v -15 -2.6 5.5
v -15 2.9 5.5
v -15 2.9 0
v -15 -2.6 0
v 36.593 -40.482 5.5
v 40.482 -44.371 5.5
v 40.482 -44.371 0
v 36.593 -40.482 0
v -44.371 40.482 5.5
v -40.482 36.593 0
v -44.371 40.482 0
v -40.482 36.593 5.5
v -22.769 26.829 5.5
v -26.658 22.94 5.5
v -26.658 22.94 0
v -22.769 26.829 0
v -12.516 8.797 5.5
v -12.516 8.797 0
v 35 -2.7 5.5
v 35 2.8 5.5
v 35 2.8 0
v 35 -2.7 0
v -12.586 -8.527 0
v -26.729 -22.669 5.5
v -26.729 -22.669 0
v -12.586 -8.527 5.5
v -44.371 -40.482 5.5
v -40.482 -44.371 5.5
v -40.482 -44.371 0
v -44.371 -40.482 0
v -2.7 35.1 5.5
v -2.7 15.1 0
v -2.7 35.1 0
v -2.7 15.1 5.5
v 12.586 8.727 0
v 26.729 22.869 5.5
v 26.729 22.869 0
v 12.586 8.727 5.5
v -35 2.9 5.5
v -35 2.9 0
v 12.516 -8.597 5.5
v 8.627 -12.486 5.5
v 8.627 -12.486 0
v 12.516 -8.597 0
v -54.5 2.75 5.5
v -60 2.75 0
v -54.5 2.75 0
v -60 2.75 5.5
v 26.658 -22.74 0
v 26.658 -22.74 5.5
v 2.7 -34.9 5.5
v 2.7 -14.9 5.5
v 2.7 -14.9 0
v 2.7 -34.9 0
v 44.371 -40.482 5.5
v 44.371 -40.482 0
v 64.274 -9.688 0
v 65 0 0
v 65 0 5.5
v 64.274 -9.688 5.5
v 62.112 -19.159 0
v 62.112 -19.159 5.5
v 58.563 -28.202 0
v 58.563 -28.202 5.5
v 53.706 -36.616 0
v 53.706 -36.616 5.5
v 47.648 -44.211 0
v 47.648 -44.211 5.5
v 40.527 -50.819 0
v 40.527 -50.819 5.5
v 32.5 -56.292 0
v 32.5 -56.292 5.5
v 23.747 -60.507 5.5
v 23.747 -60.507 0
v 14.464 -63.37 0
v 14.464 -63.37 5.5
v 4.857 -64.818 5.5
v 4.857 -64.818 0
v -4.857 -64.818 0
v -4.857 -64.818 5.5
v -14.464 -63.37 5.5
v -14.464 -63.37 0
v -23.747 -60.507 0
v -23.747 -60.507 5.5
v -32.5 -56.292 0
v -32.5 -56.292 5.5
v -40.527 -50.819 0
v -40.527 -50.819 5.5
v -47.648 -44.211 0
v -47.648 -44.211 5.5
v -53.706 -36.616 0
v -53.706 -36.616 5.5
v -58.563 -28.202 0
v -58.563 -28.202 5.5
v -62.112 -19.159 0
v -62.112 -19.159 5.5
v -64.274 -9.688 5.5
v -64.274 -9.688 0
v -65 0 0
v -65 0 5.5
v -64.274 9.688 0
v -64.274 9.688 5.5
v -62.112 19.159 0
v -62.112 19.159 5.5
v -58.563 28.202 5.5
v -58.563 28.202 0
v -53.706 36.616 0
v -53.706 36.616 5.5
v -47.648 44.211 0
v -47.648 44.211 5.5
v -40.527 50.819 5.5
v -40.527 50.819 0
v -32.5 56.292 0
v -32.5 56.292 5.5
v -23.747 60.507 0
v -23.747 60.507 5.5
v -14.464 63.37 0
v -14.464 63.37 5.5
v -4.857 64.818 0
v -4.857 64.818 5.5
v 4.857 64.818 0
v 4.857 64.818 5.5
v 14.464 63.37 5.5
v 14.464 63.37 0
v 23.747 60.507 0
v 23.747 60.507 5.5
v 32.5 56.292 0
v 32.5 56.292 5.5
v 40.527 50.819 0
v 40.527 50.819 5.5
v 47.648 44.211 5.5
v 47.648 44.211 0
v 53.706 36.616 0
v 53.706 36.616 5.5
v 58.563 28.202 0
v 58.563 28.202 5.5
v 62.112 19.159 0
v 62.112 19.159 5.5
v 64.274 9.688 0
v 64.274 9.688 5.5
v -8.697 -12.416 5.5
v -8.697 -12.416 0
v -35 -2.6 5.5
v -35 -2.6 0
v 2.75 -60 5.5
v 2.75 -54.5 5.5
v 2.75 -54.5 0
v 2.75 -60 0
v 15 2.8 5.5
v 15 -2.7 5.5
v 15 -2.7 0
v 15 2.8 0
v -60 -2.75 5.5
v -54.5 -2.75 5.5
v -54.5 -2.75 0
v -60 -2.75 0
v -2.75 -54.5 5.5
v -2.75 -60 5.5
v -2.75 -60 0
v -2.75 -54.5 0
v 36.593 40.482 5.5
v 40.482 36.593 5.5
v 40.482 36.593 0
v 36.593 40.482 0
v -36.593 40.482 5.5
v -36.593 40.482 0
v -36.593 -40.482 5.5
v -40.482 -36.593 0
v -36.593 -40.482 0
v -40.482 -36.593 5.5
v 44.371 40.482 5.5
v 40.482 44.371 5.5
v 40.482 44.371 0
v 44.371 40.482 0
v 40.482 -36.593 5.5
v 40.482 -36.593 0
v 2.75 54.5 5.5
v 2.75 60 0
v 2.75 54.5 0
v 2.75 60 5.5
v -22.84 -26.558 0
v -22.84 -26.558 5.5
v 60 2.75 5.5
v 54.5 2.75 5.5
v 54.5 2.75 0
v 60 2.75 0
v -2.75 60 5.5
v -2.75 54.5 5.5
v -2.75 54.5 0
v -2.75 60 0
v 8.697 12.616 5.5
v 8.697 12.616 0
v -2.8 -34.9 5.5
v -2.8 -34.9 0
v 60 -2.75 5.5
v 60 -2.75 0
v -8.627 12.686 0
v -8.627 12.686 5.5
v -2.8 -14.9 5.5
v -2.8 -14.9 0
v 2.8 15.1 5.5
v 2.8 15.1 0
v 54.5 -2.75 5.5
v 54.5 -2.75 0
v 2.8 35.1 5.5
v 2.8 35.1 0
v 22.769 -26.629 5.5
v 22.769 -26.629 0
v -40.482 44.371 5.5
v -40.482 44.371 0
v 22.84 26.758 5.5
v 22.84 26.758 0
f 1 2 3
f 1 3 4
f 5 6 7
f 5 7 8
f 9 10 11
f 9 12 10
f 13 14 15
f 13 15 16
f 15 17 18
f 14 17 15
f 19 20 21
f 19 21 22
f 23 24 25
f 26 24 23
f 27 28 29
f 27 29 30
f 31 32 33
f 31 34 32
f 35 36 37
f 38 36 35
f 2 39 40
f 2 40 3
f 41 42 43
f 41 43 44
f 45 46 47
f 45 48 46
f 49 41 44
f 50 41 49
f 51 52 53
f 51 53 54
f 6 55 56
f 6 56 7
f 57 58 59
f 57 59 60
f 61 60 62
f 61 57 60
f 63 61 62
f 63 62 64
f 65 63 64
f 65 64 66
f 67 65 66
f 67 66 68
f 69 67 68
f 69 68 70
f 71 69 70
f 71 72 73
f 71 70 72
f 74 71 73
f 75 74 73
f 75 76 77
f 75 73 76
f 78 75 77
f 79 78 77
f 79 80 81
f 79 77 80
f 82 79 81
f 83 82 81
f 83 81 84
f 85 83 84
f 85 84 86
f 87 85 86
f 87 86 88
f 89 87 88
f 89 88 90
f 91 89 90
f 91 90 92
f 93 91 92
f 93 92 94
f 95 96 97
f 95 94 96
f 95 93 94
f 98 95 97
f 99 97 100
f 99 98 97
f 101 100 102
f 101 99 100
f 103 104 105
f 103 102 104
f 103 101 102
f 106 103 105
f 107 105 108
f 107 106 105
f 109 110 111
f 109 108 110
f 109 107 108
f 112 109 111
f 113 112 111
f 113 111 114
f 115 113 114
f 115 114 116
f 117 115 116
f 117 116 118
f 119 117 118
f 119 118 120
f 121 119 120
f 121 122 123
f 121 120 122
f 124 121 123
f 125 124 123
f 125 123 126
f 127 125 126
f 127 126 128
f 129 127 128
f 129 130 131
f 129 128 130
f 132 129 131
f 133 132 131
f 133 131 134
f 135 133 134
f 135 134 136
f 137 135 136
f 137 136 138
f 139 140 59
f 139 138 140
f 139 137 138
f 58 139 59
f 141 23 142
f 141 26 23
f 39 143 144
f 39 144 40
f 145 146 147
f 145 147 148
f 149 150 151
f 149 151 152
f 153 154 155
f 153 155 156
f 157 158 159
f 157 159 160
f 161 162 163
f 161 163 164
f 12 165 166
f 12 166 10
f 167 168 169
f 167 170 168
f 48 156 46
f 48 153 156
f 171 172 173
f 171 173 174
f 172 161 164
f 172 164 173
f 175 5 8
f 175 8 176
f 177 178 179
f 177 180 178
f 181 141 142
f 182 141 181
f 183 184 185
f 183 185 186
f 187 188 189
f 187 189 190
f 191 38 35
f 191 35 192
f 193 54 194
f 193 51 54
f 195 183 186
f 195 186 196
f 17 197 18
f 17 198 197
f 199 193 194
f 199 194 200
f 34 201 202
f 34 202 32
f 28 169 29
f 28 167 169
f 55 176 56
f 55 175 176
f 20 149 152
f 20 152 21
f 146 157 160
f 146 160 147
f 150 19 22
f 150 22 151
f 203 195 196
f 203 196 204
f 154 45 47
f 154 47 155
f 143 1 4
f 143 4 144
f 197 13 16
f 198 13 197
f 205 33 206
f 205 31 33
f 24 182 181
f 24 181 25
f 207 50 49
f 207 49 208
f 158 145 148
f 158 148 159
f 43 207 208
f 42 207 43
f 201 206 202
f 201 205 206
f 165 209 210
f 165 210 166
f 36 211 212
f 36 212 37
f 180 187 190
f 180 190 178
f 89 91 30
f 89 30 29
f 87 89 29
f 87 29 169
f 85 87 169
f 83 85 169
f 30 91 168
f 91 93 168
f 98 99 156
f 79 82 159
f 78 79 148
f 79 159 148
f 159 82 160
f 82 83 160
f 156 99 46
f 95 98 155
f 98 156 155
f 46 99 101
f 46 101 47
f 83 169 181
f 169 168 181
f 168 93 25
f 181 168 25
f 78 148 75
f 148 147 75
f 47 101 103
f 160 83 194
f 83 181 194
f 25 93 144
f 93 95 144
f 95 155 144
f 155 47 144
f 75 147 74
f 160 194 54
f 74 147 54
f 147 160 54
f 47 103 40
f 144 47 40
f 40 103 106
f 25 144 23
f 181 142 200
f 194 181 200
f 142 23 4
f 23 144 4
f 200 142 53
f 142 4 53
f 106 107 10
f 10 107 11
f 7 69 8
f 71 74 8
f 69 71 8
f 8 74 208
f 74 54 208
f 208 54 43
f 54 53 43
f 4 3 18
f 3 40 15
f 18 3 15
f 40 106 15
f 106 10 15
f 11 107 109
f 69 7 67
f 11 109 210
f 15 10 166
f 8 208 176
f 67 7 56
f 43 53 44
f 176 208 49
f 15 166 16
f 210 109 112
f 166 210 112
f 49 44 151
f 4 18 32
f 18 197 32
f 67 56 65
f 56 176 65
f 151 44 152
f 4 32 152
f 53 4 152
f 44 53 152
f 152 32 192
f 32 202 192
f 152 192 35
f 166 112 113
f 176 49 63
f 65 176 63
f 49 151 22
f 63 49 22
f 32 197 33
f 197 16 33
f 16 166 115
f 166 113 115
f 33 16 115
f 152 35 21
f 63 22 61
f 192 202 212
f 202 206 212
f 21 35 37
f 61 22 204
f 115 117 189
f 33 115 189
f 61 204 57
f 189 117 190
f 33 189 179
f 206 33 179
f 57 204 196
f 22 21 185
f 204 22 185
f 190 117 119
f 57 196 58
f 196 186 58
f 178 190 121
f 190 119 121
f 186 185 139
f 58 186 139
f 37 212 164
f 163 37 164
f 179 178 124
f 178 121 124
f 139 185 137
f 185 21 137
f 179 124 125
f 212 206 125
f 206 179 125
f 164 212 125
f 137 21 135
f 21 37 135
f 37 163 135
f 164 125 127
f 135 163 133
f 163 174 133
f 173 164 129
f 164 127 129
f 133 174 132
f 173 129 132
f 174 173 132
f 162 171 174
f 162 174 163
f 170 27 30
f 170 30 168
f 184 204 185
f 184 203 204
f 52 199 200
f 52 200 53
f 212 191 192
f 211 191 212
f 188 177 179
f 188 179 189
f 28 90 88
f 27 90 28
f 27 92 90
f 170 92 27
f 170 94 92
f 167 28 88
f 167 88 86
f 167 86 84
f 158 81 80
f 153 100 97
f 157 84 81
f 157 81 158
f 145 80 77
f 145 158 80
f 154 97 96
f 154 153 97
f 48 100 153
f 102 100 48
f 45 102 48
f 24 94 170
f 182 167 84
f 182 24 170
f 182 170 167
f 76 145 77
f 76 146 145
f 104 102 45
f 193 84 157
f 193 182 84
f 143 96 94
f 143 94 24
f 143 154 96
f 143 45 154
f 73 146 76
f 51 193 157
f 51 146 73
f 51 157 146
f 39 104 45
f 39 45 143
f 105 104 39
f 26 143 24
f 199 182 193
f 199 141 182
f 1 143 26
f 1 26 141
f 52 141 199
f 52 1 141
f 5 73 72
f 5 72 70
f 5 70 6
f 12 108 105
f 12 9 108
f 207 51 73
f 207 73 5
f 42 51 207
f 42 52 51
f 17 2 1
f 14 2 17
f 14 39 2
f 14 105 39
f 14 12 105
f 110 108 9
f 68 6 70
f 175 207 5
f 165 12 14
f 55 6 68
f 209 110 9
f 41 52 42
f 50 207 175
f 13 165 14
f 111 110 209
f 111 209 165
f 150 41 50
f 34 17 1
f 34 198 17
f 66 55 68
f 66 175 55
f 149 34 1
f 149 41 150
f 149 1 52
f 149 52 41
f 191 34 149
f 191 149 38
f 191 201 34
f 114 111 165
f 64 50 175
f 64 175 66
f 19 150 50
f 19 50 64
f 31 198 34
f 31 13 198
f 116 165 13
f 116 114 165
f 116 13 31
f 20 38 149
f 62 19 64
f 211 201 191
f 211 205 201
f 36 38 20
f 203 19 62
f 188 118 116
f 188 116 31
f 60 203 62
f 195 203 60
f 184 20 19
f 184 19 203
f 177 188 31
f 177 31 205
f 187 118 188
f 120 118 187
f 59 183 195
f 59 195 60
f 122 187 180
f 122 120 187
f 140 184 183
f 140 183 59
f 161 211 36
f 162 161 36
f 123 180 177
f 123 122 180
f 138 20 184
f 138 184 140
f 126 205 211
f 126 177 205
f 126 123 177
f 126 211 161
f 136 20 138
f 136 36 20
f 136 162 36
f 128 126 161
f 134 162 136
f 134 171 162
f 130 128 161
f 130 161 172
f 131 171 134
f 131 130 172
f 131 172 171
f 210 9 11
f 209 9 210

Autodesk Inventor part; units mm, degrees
ref_plane "YZ Plane" through (0, 0, 0) normal (1, 0, 0) x (0, 1, 0)
ref_plane "XZ Plane" through (0, 0, 0) normal (0, 1, 0) x (-1, 0, 0)
ref_plane "XY Plane" through (0, 0, 0) normal (0, 0, 1) x (1, 0, 0)
sketch "Sketch1" plane through (0, 0, 0) normal (0, 0, 1) x (1, 0, 0)
  circle A0 centre (0, 0) radius 65
  dimension "d0" = 130
extrude "Extrusion1" add sketch "Sketch1" along normal blind 5.5
sketch "Sketch4" plane through (0, 0, 5.5) normal (0, 0, 1) x (1, 0, 0)
  line L0 (15, -2.7) -> (15, 2.8)
  line L1 (8.6974, 12.6158) -> (22.8395, 26.7579)
  line L2 (22.8395, 26.7579) -> (26.7286, 22.8688)
  line L3 (26.7286, 22.8688) -> (12.5865, 8.7267)
  line L4 (-8.6267, 12.6865) -> (-12.5158, 8.7974)
  line L5 (-12.5158, 8.7974) -> (-26.6579, 22.9395)
  line L6 (-26.6579, 22.9395) -> (-22.7688, 26.8286)
  line L7 (-22.7688, 26.8286) -> (-8.6267, 12.6865)
  line L8 (2.8, 15.1) -> (-2.7, 15.1)
  line L9 (12.5865, 8.7267) -> (8.6974, 12.6158)
  line L10 (-2.7, 15.1) -> (-2.7, 35.1)
  line L11 (-2.7, 35.1) -> (2.8, 35.1)
  line L12 (2.8, 35.1) -> (2.8, 15.1)
  line L13 (-15, 2.9) -> (-15, -2.6)
  line L14 (-35, 2.9) -> (-15, 2.9)
  line L15 (-35, -2.6) -> (-35, 2.9)
  line L16 (-15, -2.6) -> (-35, -2.6)
  line L17 (-12.5865, -8.5267) -> (-8.6974, -12.4158)
  line L18 (-26.7286, -22.6688) -> (-12.5865, -8.5267)
  line L19 (-8.6974, -12.4158) -> (-22.8395, -26.5579)
  line L20 (-22.8395, -26.5579) -> (-26.7286, -22.6688)
  line L21 (15, 2.8) -> (35, 2.8)
  line L22 (35, 2.8) -> (35, -2.7)
  line L23 (35, -2.7) -> (15, -2.7)
  line L24 (-2.8, -14.9) -> (2.7, -14.9)
  line L25 (8.6267, -12.4865) -> (12.5158, -8.5974)
  line L26 (2.7, -14.9) -> (2.7, -34.9)
  line L27 (2.7, -34.9) -> (-2.8, -34.9)
  line L28 (22.7688, -26.6286) -> (8.6267, -12.4865)
  line L29 (12.5158, -8.5974) -> (26.6579, -22.7395)
  line L30 (26.6579, -22.7395) -> (22.7688, -26.6286)
  line L31 (-2.8, -34.9) -> (-2.8, -14.9)
  line L32 (24.2998, 0.05) -> (27.4417, 0.05)
  point P0 (0, 0)
  point P1 (0, 0)
  point P2 (0, 0)
  point P3 (0, 0.1)
  dimension "d21" = 20
  dimension "d22" = 5.5
  dimension "d23" = 360
  dimension "d24" = 2.75
extrude "Extrusion4" cut sketch "Sketch4" against normal blind 10
sketch "Sketch5" plane through (0, 0, 5.5) normal (0, 0, 1) x (1, 0, 0)
  line L0 (54.5, 2.75) -> (60, 2.75)
  line L1 (60, 2.75) -> (60, -2.75)
  line L2 (60, -2.75) -> (54.5, -2.75)
  line L3 (54.5, -2.75) -> (54.5, 2.75)
  line L4 (36.5928, 40.4819) -> (40.4819, 44.371)
  line L5 (40.4819, 44.371) -> (44.371, 40.4819)
  line L6 (44.371, 40.4819) -> (40.4819, 36.5928)
  line L7 (40.4819, 36.5928) -> (36.5928, 40.4819)
  line L8 (-2.75, 54.5) -> (-2.75, 60)
  line L9 (-2.75, 60) -> (2.75, 60)
  line L10 (2.75, 60) -> (2.75, 54.5)
  line L11 (2.75, 54.5) -> (-2.75, 54.5)
  line L12 (-40.4819, 36.5928) -> (-44.371, 40.4819)
  line L13 (-44.371, 40.4819) -> (-40.4819, 44.371)
  line L14 (-40.4819, 44.371) -> (-36.5928, 40.4819)
  line L15 (-36.5928, 40.4819) -> (-40.4819, 36.5928)
  line L16 (-54.5, -2.75) -> (-60, -2.75)
  line L17 (-60, -2.75) -> (-60, 2.75)
  line L18 (-60, 2.75) -> (-54.5, 2.75)
  line L19 (-54.5, 2.75) -> (-54.5, -2.75)
  line L20 (-36.5928, -40.4819) -> (-40.4819, -44.371)
  line L21 (-40.4819, -44.371) -> (-44.371, -40.4819)
  line L22 (-44.371, -40.4819) -> (-40.4819, -36.5928)
  line L23 (-40.4819, -36.5928) -> (-36.5928, -40.4819)
  line L24 (2.75, -54.5) -> (2.75, -60)
  line L25 (2.75, -60) -> (-2.75, -60)
  line L26 (-2.75, -60) -> (-2.75, -54.5)
  line L27 (-2.75, -54.5) -> (2.75, -54.5)
  line L28 (40.4819, -36.5928) -> (44.371, -40.4819)
  line L29 (44.371, -40.4819) -> (40.4819, -44.371)
  line L30 (40.4819, -44.371) -> (36.5928, -40.4819)
  line L31 (36.5928, -40.4819) -> (40.4819, -36.5928)
  point P0 (0, 0)
  dimension "d30" = 5.5
  dimension "d31" = 5.5
  dimension "d34" = 360
extrude "Extrusion5" cut sketch "Sketch5" against normal blind 10
properties part number "base"
